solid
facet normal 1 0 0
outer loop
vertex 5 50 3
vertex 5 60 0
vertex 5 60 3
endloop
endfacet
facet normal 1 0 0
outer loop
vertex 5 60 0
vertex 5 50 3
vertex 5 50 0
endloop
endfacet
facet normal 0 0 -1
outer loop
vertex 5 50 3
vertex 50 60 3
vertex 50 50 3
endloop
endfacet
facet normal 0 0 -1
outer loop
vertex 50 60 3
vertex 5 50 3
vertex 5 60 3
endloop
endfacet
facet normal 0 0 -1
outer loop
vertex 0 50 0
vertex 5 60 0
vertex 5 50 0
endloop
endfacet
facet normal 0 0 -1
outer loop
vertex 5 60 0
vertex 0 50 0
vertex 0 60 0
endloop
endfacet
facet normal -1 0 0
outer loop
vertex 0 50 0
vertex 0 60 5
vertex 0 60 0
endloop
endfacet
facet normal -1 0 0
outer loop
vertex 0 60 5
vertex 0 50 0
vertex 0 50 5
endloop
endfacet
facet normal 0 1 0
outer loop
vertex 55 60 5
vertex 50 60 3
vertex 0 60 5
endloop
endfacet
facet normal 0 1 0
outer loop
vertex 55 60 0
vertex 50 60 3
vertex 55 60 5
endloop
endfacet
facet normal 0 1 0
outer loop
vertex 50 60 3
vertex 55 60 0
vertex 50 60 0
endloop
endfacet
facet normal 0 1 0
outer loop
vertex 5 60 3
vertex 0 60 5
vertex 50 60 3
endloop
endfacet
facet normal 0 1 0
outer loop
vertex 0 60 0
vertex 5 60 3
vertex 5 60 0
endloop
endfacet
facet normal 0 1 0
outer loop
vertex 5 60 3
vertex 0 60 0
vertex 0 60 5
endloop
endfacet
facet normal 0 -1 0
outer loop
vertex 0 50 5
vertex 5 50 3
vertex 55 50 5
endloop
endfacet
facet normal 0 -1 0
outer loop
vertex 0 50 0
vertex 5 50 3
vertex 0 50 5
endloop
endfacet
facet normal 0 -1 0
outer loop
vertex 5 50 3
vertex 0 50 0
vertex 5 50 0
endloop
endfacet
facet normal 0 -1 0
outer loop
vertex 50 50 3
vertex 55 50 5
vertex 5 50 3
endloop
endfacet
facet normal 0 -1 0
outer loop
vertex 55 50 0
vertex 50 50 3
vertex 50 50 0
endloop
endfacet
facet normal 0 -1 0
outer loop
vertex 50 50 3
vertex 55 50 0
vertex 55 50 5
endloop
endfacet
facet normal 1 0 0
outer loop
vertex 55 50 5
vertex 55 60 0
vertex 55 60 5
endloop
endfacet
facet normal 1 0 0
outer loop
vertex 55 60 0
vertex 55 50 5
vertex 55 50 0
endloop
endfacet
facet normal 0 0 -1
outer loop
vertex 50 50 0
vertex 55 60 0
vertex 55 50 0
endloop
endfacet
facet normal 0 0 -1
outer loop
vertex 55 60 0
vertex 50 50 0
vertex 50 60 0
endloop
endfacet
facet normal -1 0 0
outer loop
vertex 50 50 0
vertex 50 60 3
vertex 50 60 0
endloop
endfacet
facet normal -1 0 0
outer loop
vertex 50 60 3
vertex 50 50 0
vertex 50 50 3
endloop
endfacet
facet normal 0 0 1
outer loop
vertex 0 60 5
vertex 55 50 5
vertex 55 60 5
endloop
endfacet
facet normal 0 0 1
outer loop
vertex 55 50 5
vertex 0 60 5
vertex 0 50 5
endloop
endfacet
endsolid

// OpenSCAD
w1 = 30;
w2 = 60;
h = 3;

for(w=[50])
{
  translate([0, w, 0])
  {
    for(dx=[0, w])
      translate([dx, 0, 0])
        cube([5, 10, h]);
    translate([0, 0, h])
      cube([5+w, 10, 2]);
  }
}
